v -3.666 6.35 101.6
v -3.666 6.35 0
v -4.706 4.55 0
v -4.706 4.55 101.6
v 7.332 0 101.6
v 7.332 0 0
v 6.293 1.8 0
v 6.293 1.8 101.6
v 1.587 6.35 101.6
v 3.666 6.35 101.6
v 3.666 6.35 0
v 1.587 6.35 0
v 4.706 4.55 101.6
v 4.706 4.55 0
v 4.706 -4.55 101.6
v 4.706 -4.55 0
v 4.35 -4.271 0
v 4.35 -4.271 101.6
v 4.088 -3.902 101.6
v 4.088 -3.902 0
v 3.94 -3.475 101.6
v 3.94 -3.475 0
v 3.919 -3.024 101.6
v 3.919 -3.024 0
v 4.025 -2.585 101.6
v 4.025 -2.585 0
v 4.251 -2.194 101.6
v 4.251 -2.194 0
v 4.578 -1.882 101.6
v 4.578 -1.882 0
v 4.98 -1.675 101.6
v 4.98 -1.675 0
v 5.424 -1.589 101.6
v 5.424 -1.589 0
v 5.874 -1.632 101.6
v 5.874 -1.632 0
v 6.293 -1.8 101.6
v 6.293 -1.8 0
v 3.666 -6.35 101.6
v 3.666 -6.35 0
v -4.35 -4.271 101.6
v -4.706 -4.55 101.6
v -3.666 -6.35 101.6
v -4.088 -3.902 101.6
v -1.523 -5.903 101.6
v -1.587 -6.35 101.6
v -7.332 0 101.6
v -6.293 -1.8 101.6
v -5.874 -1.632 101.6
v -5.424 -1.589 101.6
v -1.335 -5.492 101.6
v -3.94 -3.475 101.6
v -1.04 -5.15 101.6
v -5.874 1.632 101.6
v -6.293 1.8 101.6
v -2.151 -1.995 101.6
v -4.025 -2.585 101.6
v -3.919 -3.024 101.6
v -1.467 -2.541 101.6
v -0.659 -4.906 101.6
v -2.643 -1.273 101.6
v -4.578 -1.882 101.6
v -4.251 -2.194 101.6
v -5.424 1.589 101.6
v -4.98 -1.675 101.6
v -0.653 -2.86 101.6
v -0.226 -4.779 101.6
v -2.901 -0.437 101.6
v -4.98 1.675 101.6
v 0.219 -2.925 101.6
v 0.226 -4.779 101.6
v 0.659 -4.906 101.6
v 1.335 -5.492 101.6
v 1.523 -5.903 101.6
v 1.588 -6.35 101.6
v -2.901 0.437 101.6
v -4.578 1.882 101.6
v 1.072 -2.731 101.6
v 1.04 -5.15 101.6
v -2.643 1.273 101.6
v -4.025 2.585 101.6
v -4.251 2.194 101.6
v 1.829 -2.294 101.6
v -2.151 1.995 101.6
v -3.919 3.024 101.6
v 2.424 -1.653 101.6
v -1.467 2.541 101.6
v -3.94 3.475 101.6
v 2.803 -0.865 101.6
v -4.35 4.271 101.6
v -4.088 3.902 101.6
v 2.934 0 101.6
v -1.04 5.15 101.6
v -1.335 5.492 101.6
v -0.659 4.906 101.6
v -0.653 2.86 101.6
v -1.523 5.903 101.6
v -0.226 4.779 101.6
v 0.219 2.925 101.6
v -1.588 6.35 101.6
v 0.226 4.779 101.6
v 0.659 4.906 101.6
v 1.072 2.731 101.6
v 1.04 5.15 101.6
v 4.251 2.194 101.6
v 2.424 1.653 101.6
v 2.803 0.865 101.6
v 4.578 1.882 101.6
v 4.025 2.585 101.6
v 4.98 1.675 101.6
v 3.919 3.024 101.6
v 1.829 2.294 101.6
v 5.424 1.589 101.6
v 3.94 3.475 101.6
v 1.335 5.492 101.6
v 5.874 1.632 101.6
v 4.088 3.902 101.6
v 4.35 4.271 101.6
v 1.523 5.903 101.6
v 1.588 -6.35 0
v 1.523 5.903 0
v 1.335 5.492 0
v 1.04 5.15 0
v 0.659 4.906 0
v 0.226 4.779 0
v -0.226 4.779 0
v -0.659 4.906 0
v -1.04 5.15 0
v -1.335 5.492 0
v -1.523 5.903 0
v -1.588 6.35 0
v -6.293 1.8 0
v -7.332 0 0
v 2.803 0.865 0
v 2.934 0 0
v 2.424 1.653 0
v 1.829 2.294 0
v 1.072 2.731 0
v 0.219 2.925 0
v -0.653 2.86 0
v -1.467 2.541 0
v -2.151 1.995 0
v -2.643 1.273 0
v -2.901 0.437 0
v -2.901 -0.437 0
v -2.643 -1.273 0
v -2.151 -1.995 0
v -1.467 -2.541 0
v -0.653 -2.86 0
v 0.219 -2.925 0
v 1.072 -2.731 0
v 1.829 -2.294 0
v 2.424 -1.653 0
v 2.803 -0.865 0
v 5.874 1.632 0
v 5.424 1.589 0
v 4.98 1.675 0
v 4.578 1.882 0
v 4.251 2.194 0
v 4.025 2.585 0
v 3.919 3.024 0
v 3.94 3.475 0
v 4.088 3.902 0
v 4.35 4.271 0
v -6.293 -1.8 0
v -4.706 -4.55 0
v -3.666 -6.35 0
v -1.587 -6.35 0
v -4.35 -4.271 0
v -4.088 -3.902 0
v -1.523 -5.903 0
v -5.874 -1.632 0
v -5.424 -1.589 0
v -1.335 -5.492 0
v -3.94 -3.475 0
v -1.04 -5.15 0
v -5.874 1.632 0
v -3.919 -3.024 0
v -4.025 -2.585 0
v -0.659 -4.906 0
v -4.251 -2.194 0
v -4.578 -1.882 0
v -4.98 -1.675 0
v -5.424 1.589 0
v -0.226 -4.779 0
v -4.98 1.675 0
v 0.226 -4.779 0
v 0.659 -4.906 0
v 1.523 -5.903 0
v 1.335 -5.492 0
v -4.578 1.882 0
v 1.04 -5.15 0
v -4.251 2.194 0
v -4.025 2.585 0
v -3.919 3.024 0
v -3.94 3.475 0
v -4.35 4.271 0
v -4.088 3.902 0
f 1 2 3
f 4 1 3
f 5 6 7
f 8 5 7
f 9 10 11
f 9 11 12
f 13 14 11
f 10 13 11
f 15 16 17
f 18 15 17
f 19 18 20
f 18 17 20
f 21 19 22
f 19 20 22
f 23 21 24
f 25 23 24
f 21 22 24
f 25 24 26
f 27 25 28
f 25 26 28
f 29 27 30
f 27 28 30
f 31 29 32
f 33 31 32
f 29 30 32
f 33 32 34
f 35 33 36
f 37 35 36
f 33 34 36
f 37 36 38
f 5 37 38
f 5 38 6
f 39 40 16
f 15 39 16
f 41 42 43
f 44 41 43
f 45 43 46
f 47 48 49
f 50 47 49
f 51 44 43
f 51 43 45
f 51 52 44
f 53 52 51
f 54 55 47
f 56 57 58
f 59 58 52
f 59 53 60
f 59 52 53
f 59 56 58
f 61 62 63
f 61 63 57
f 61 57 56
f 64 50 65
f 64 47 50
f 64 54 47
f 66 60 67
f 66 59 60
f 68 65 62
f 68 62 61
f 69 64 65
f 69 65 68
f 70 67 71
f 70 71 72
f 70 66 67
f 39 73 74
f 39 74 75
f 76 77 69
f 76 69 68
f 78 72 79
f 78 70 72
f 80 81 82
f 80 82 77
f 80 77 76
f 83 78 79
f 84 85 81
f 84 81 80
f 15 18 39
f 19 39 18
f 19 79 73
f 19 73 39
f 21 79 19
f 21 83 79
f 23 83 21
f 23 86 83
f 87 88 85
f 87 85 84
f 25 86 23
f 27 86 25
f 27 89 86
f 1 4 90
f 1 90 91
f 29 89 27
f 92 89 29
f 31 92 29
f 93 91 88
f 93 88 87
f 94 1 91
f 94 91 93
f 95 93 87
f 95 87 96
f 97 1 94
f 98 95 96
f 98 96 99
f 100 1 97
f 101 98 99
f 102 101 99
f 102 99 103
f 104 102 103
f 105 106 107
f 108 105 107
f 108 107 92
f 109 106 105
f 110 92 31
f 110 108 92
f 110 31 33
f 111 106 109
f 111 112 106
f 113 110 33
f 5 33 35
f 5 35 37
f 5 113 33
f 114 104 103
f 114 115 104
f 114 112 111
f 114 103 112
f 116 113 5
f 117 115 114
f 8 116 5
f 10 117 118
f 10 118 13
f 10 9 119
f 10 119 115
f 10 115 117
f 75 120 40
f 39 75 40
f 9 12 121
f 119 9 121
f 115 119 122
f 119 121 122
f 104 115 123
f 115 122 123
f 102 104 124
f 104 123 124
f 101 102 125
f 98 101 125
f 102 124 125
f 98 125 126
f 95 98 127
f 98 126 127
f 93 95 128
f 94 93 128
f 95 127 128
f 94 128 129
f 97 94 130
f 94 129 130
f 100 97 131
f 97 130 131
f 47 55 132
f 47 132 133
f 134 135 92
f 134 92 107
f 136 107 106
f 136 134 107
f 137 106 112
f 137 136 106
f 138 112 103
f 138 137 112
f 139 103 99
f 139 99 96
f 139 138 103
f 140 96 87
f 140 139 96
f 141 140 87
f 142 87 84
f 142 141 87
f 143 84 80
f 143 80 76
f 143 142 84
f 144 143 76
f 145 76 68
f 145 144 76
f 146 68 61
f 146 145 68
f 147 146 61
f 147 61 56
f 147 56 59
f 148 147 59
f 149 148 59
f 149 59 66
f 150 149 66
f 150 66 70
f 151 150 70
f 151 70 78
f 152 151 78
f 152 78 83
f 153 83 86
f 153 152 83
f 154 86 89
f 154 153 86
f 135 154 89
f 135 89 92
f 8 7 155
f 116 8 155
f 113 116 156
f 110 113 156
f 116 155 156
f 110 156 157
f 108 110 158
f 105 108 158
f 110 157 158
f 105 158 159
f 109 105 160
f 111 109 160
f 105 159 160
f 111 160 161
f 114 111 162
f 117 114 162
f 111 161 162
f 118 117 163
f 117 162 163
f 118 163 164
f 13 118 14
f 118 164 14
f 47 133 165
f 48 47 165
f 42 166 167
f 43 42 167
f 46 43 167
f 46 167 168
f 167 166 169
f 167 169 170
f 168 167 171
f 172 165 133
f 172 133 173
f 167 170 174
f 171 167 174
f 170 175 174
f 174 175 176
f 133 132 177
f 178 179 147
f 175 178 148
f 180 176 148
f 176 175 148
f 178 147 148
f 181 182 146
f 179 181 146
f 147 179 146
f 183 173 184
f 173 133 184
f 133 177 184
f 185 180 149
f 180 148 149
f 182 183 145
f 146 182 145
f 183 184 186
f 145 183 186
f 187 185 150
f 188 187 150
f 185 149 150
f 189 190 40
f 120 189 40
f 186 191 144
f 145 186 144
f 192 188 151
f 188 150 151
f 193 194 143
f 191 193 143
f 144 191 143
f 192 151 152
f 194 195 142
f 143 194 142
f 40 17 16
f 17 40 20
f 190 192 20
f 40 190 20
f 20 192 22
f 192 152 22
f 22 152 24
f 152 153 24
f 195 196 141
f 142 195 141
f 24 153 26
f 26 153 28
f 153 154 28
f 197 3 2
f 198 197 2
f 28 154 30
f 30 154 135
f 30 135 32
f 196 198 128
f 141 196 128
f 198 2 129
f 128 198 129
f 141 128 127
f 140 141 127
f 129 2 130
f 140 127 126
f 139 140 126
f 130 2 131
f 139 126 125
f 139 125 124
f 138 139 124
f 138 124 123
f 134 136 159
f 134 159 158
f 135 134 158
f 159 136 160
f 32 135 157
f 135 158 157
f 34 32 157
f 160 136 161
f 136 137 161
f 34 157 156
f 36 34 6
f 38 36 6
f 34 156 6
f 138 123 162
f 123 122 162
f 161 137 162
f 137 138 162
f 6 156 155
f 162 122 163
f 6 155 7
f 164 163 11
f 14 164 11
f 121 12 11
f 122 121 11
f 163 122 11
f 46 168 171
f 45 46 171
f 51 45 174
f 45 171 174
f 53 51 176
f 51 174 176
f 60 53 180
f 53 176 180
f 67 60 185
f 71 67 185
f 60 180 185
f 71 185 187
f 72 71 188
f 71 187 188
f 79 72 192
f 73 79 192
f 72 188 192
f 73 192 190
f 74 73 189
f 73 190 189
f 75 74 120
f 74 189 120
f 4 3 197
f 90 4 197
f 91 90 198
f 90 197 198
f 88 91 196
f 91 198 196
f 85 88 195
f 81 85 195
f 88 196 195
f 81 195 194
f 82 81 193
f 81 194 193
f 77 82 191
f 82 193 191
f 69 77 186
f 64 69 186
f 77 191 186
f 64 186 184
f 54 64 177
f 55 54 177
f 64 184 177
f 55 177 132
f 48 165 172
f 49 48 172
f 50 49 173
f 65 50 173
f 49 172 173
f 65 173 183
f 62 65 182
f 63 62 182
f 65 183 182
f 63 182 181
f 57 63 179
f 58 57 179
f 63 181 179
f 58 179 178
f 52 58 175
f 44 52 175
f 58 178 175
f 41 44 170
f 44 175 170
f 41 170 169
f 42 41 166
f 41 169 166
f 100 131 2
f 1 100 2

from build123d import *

# Parameters (mm, degrees)
SKETCH1_R           = 2.9337
BOSS_EXTRUDE1_DEPTH = 101.6


with BuildPart() as part:
    # Sketch1 → Boss-Extrude1 (new body)
    with BuildSketch(Plane.XY):
        with BuildLine():
            Line((-1.587500385, 6.349999904), (-3.666174594, 6.349999778))
            Line((-3.666174594, 6.349999778), (-4.70551159, 4.549815043))
            ThreePointArc((-4.70551159, 4.549815043), (-4.12444613, 2.38124975), (-6.293011423, 1.80018429))
            Line((-6.293011423, 1.80018429), (-7.332348419, -4.44e-07))
            Line((-7.332348419, -4.44e-07), (-6.293011205, -1.800185053))
            ThreePointArc((-6.293011205, -1.800185053), (-4.124445841, -2.38125025), (-4.705511038, -4.549815614))
            Line((-4.705511038, -4.549815614), (-3.666173825, -6.350000222))
            Line((-3.666173825, -6.350000222), (-1.587499615, -6.350000096))
            ThreePointArc((-1.587499615, -6.350000096), (2.89e-07, -4.7625), (1.587500385, -6.349999904))
            Line((1.587500385, -6.349999904), (3.666174594, -6.349999778))
            Line((3.666174594, -6.349999778), (4.70551159, -4.549815043))
            ThreePointArc((4.70551159, -4.549815043), (4.12444613, -2.38124975), (6.293011423, -1.80018429))
            Line((6.293011423, -1.80018429), (7.332348419, 4.44e-07))
            Line((7.332348419, 4.44e-07), (6.293011205, 1.800185053))
            ThreePointArc((6.293011205, 1.800185053), (4.124445841, 2.38125025), (4.705511038, 4.549815614))
            Line((4.705511038, 4.549815614), (3.666173825, 6.350000222))
            Line((3.666173825, 6.350000222), (1.587499615, 6.350000096))
            ThreePointArc((1.587499615, 6.350000096), (-2.89e-07, 4.7625), (-1.587500385, 6.349999904))
        make_face()
        Circle(SKETCH1_R, mode=Mode.SUBTRACT)
    extrude(amount=BOSS_EXTRUDE1_DEPTH)


solid = part.part
